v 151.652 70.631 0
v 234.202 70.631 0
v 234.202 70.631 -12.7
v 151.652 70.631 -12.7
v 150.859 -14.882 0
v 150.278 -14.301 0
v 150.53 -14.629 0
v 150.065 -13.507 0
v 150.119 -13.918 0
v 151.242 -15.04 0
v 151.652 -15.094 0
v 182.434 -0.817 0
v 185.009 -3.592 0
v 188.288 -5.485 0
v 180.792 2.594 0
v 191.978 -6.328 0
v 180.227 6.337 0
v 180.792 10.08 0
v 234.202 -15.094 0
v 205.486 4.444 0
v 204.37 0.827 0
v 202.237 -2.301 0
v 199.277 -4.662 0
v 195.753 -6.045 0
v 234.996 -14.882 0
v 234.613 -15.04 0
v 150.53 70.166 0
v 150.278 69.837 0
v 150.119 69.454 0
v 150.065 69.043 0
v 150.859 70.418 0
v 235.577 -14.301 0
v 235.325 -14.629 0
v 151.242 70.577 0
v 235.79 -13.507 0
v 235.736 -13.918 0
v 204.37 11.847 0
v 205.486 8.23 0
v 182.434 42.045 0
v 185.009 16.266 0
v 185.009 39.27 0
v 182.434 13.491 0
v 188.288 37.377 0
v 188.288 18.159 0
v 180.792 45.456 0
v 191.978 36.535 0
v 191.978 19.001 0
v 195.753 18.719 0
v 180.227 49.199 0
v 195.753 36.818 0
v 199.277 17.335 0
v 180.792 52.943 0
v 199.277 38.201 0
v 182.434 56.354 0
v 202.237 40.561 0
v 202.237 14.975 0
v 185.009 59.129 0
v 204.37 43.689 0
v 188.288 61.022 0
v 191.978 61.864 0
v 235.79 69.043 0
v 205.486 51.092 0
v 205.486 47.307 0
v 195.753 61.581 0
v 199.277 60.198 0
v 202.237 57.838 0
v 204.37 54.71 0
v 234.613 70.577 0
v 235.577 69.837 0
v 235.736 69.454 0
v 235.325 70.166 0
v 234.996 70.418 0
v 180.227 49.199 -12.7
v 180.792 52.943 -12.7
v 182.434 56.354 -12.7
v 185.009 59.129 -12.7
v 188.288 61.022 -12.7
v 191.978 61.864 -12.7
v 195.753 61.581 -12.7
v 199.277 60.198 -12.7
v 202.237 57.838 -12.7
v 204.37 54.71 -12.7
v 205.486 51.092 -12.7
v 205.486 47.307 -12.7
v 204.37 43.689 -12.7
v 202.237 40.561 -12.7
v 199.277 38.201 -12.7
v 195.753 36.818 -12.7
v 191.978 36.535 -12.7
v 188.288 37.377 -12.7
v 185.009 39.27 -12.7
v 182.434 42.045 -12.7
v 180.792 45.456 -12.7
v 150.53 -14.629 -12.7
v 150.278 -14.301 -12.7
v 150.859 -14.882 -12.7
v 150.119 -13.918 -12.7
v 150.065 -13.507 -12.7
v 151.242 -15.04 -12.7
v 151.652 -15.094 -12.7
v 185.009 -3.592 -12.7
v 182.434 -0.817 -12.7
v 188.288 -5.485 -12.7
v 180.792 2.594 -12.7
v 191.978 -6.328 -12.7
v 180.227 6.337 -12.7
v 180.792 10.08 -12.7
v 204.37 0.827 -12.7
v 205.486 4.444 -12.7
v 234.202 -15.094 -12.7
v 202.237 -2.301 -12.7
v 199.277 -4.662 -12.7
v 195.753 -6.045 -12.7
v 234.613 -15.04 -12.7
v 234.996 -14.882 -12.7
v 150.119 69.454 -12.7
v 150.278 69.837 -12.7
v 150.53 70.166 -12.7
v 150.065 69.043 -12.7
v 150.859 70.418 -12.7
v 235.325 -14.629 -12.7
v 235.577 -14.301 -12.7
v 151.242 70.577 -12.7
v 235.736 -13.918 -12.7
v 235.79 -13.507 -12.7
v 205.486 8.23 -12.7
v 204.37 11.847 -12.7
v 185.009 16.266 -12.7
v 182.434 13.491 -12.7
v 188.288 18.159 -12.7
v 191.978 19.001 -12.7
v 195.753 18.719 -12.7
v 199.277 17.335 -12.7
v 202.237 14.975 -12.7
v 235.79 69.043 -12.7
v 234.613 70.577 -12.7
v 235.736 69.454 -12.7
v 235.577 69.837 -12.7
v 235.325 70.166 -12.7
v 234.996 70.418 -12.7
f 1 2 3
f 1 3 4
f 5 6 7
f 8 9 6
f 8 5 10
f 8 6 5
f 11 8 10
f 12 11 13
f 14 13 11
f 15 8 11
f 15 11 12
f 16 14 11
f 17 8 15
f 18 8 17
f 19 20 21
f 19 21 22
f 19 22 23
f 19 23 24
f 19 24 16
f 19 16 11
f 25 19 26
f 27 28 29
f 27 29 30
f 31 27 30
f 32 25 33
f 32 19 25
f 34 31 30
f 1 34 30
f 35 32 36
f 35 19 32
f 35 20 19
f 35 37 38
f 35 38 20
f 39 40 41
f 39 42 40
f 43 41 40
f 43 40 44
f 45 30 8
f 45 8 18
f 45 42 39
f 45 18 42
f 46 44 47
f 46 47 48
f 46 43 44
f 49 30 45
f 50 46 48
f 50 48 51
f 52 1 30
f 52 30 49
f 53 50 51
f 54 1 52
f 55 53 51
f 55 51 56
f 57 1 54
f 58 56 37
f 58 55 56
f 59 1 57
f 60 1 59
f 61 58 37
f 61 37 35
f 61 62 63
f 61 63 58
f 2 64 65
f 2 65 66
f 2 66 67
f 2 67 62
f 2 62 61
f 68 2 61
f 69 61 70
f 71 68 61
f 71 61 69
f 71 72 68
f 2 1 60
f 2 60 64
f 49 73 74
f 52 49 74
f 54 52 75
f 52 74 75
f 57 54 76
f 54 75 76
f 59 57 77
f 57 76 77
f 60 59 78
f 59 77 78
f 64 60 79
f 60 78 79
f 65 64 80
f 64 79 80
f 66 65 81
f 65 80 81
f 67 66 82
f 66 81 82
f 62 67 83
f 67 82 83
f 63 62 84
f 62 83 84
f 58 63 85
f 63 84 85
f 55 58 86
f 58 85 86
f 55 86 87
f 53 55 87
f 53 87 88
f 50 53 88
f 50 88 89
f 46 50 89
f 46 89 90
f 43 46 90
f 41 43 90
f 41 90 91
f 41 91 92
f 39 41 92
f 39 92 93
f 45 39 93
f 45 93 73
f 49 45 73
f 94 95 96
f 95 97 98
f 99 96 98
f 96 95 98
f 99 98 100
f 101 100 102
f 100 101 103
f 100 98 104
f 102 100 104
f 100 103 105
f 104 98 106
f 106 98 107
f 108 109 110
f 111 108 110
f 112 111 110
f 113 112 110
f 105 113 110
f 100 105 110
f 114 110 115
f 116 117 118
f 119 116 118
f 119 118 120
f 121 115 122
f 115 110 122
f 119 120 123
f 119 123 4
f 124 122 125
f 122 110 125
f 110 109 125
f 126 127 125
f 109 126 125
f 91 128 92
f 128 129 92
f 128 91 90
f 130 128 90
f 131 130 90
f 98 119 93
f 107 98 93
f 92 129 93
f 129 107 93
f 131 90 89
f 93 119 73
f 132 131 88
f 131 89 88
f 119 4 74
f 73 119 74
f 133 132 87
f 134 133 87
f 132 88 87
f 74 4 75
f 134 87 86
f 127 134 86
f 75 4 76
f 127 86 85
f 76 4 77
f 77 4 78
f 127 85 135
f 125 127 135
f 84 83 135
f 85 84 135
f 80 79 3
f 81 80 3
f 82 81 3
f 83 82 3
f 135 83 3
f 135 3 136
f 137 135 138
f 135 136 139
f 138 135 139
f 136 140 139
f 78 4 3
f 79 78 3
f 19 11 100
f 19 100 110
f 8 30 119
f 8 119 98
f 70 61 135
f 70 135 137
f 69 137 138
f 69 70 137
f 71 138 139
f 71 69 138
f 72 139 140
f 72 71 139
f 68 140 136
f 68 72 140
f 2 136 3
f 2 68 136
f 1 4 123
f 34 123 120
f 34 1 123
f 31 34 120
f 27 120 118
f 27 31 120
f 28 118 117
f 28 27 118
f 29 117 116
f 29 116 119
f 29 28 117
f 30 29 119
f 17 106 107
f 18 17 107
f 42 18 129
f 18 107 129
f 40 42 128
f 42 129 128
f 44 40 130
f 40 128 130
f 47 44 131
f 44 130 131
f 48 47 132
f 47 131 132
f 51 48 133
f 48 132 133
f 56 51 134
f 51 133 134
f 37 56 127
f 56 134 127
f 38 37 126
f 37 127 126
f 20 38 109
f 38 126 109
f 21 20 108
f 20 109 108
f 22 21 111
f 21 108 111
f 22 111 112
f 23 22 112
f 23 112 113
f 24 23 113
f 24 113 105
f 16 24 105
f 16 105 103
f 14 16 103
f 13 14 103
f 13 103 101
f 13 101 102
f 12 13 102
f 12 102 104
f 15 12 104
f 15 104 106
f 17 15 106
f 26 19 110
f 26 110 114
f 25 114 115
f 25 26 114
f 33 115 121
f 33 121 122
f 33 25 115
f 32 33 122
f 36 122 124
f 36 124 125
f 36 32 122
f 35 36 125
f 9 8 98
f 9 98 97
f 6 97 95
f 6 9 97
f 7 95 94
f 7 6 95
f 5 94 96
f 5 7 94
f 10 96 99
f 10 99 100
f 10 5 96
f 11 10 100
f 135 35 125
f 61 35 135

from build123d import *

# Parameters (mm, degrees)
BOSS_EXTRUDE1_DEPTH        = 12.7
F_1_1_DIAMETER_HOLE1_D     = 25.4
F_1_1_DIAMETER_HOLE1_DEPTH = 12.7


with BuildPart() as part:
    # Sketch1 → Boss-Extrude1 (new body)
    with BuildSketch(Plane.XY):
        with BuildLine():
            Line((150.064965963, 69.04320968), (150.064965963, -13.50679032))
            ThreePointArc((150.064965963, -13.50679032), (150.529933948, -14.629322335), (151.652465963, -15.09429032))
            Line((151.652465963, -15.09429032), (234.202465963, -15.09429032))
            ThreePointArc((234.202465963, -15.09429032), (235.324997978, -14.629322335), (235.789965963, -13.50679032))
            Line((235.789965963, -13.50679032), (235.789965963, 69.04320968))
            ThreePointArc((235.789965963, 69.04320968), (235.324997978, 70.165741695), (234.202465963, 70.63070968))
            Line((234.202465963, 70.63070968), (151.652465963, 70.63070968))
            ThreePointArc((151.652465963, 70.63070968), (150.529933948, 70.165741695), (150.064965963, 69.04320968))
        make_face()
    extrude(amount=-BOSS_EXTRUDE1_DEPTH)

    # 1 (1) Diameter Hole1
    with Locations(Plane.XY):
        with Locations((192.927465963, 6.33695968), (192.927465963, 49.19945968)):
            Hole(F_1_1_DIAMETER_HOLE1_D / 2, depth=F_1_1_DIAMETER_HOLE1_DEPTH)


solid = part.part
